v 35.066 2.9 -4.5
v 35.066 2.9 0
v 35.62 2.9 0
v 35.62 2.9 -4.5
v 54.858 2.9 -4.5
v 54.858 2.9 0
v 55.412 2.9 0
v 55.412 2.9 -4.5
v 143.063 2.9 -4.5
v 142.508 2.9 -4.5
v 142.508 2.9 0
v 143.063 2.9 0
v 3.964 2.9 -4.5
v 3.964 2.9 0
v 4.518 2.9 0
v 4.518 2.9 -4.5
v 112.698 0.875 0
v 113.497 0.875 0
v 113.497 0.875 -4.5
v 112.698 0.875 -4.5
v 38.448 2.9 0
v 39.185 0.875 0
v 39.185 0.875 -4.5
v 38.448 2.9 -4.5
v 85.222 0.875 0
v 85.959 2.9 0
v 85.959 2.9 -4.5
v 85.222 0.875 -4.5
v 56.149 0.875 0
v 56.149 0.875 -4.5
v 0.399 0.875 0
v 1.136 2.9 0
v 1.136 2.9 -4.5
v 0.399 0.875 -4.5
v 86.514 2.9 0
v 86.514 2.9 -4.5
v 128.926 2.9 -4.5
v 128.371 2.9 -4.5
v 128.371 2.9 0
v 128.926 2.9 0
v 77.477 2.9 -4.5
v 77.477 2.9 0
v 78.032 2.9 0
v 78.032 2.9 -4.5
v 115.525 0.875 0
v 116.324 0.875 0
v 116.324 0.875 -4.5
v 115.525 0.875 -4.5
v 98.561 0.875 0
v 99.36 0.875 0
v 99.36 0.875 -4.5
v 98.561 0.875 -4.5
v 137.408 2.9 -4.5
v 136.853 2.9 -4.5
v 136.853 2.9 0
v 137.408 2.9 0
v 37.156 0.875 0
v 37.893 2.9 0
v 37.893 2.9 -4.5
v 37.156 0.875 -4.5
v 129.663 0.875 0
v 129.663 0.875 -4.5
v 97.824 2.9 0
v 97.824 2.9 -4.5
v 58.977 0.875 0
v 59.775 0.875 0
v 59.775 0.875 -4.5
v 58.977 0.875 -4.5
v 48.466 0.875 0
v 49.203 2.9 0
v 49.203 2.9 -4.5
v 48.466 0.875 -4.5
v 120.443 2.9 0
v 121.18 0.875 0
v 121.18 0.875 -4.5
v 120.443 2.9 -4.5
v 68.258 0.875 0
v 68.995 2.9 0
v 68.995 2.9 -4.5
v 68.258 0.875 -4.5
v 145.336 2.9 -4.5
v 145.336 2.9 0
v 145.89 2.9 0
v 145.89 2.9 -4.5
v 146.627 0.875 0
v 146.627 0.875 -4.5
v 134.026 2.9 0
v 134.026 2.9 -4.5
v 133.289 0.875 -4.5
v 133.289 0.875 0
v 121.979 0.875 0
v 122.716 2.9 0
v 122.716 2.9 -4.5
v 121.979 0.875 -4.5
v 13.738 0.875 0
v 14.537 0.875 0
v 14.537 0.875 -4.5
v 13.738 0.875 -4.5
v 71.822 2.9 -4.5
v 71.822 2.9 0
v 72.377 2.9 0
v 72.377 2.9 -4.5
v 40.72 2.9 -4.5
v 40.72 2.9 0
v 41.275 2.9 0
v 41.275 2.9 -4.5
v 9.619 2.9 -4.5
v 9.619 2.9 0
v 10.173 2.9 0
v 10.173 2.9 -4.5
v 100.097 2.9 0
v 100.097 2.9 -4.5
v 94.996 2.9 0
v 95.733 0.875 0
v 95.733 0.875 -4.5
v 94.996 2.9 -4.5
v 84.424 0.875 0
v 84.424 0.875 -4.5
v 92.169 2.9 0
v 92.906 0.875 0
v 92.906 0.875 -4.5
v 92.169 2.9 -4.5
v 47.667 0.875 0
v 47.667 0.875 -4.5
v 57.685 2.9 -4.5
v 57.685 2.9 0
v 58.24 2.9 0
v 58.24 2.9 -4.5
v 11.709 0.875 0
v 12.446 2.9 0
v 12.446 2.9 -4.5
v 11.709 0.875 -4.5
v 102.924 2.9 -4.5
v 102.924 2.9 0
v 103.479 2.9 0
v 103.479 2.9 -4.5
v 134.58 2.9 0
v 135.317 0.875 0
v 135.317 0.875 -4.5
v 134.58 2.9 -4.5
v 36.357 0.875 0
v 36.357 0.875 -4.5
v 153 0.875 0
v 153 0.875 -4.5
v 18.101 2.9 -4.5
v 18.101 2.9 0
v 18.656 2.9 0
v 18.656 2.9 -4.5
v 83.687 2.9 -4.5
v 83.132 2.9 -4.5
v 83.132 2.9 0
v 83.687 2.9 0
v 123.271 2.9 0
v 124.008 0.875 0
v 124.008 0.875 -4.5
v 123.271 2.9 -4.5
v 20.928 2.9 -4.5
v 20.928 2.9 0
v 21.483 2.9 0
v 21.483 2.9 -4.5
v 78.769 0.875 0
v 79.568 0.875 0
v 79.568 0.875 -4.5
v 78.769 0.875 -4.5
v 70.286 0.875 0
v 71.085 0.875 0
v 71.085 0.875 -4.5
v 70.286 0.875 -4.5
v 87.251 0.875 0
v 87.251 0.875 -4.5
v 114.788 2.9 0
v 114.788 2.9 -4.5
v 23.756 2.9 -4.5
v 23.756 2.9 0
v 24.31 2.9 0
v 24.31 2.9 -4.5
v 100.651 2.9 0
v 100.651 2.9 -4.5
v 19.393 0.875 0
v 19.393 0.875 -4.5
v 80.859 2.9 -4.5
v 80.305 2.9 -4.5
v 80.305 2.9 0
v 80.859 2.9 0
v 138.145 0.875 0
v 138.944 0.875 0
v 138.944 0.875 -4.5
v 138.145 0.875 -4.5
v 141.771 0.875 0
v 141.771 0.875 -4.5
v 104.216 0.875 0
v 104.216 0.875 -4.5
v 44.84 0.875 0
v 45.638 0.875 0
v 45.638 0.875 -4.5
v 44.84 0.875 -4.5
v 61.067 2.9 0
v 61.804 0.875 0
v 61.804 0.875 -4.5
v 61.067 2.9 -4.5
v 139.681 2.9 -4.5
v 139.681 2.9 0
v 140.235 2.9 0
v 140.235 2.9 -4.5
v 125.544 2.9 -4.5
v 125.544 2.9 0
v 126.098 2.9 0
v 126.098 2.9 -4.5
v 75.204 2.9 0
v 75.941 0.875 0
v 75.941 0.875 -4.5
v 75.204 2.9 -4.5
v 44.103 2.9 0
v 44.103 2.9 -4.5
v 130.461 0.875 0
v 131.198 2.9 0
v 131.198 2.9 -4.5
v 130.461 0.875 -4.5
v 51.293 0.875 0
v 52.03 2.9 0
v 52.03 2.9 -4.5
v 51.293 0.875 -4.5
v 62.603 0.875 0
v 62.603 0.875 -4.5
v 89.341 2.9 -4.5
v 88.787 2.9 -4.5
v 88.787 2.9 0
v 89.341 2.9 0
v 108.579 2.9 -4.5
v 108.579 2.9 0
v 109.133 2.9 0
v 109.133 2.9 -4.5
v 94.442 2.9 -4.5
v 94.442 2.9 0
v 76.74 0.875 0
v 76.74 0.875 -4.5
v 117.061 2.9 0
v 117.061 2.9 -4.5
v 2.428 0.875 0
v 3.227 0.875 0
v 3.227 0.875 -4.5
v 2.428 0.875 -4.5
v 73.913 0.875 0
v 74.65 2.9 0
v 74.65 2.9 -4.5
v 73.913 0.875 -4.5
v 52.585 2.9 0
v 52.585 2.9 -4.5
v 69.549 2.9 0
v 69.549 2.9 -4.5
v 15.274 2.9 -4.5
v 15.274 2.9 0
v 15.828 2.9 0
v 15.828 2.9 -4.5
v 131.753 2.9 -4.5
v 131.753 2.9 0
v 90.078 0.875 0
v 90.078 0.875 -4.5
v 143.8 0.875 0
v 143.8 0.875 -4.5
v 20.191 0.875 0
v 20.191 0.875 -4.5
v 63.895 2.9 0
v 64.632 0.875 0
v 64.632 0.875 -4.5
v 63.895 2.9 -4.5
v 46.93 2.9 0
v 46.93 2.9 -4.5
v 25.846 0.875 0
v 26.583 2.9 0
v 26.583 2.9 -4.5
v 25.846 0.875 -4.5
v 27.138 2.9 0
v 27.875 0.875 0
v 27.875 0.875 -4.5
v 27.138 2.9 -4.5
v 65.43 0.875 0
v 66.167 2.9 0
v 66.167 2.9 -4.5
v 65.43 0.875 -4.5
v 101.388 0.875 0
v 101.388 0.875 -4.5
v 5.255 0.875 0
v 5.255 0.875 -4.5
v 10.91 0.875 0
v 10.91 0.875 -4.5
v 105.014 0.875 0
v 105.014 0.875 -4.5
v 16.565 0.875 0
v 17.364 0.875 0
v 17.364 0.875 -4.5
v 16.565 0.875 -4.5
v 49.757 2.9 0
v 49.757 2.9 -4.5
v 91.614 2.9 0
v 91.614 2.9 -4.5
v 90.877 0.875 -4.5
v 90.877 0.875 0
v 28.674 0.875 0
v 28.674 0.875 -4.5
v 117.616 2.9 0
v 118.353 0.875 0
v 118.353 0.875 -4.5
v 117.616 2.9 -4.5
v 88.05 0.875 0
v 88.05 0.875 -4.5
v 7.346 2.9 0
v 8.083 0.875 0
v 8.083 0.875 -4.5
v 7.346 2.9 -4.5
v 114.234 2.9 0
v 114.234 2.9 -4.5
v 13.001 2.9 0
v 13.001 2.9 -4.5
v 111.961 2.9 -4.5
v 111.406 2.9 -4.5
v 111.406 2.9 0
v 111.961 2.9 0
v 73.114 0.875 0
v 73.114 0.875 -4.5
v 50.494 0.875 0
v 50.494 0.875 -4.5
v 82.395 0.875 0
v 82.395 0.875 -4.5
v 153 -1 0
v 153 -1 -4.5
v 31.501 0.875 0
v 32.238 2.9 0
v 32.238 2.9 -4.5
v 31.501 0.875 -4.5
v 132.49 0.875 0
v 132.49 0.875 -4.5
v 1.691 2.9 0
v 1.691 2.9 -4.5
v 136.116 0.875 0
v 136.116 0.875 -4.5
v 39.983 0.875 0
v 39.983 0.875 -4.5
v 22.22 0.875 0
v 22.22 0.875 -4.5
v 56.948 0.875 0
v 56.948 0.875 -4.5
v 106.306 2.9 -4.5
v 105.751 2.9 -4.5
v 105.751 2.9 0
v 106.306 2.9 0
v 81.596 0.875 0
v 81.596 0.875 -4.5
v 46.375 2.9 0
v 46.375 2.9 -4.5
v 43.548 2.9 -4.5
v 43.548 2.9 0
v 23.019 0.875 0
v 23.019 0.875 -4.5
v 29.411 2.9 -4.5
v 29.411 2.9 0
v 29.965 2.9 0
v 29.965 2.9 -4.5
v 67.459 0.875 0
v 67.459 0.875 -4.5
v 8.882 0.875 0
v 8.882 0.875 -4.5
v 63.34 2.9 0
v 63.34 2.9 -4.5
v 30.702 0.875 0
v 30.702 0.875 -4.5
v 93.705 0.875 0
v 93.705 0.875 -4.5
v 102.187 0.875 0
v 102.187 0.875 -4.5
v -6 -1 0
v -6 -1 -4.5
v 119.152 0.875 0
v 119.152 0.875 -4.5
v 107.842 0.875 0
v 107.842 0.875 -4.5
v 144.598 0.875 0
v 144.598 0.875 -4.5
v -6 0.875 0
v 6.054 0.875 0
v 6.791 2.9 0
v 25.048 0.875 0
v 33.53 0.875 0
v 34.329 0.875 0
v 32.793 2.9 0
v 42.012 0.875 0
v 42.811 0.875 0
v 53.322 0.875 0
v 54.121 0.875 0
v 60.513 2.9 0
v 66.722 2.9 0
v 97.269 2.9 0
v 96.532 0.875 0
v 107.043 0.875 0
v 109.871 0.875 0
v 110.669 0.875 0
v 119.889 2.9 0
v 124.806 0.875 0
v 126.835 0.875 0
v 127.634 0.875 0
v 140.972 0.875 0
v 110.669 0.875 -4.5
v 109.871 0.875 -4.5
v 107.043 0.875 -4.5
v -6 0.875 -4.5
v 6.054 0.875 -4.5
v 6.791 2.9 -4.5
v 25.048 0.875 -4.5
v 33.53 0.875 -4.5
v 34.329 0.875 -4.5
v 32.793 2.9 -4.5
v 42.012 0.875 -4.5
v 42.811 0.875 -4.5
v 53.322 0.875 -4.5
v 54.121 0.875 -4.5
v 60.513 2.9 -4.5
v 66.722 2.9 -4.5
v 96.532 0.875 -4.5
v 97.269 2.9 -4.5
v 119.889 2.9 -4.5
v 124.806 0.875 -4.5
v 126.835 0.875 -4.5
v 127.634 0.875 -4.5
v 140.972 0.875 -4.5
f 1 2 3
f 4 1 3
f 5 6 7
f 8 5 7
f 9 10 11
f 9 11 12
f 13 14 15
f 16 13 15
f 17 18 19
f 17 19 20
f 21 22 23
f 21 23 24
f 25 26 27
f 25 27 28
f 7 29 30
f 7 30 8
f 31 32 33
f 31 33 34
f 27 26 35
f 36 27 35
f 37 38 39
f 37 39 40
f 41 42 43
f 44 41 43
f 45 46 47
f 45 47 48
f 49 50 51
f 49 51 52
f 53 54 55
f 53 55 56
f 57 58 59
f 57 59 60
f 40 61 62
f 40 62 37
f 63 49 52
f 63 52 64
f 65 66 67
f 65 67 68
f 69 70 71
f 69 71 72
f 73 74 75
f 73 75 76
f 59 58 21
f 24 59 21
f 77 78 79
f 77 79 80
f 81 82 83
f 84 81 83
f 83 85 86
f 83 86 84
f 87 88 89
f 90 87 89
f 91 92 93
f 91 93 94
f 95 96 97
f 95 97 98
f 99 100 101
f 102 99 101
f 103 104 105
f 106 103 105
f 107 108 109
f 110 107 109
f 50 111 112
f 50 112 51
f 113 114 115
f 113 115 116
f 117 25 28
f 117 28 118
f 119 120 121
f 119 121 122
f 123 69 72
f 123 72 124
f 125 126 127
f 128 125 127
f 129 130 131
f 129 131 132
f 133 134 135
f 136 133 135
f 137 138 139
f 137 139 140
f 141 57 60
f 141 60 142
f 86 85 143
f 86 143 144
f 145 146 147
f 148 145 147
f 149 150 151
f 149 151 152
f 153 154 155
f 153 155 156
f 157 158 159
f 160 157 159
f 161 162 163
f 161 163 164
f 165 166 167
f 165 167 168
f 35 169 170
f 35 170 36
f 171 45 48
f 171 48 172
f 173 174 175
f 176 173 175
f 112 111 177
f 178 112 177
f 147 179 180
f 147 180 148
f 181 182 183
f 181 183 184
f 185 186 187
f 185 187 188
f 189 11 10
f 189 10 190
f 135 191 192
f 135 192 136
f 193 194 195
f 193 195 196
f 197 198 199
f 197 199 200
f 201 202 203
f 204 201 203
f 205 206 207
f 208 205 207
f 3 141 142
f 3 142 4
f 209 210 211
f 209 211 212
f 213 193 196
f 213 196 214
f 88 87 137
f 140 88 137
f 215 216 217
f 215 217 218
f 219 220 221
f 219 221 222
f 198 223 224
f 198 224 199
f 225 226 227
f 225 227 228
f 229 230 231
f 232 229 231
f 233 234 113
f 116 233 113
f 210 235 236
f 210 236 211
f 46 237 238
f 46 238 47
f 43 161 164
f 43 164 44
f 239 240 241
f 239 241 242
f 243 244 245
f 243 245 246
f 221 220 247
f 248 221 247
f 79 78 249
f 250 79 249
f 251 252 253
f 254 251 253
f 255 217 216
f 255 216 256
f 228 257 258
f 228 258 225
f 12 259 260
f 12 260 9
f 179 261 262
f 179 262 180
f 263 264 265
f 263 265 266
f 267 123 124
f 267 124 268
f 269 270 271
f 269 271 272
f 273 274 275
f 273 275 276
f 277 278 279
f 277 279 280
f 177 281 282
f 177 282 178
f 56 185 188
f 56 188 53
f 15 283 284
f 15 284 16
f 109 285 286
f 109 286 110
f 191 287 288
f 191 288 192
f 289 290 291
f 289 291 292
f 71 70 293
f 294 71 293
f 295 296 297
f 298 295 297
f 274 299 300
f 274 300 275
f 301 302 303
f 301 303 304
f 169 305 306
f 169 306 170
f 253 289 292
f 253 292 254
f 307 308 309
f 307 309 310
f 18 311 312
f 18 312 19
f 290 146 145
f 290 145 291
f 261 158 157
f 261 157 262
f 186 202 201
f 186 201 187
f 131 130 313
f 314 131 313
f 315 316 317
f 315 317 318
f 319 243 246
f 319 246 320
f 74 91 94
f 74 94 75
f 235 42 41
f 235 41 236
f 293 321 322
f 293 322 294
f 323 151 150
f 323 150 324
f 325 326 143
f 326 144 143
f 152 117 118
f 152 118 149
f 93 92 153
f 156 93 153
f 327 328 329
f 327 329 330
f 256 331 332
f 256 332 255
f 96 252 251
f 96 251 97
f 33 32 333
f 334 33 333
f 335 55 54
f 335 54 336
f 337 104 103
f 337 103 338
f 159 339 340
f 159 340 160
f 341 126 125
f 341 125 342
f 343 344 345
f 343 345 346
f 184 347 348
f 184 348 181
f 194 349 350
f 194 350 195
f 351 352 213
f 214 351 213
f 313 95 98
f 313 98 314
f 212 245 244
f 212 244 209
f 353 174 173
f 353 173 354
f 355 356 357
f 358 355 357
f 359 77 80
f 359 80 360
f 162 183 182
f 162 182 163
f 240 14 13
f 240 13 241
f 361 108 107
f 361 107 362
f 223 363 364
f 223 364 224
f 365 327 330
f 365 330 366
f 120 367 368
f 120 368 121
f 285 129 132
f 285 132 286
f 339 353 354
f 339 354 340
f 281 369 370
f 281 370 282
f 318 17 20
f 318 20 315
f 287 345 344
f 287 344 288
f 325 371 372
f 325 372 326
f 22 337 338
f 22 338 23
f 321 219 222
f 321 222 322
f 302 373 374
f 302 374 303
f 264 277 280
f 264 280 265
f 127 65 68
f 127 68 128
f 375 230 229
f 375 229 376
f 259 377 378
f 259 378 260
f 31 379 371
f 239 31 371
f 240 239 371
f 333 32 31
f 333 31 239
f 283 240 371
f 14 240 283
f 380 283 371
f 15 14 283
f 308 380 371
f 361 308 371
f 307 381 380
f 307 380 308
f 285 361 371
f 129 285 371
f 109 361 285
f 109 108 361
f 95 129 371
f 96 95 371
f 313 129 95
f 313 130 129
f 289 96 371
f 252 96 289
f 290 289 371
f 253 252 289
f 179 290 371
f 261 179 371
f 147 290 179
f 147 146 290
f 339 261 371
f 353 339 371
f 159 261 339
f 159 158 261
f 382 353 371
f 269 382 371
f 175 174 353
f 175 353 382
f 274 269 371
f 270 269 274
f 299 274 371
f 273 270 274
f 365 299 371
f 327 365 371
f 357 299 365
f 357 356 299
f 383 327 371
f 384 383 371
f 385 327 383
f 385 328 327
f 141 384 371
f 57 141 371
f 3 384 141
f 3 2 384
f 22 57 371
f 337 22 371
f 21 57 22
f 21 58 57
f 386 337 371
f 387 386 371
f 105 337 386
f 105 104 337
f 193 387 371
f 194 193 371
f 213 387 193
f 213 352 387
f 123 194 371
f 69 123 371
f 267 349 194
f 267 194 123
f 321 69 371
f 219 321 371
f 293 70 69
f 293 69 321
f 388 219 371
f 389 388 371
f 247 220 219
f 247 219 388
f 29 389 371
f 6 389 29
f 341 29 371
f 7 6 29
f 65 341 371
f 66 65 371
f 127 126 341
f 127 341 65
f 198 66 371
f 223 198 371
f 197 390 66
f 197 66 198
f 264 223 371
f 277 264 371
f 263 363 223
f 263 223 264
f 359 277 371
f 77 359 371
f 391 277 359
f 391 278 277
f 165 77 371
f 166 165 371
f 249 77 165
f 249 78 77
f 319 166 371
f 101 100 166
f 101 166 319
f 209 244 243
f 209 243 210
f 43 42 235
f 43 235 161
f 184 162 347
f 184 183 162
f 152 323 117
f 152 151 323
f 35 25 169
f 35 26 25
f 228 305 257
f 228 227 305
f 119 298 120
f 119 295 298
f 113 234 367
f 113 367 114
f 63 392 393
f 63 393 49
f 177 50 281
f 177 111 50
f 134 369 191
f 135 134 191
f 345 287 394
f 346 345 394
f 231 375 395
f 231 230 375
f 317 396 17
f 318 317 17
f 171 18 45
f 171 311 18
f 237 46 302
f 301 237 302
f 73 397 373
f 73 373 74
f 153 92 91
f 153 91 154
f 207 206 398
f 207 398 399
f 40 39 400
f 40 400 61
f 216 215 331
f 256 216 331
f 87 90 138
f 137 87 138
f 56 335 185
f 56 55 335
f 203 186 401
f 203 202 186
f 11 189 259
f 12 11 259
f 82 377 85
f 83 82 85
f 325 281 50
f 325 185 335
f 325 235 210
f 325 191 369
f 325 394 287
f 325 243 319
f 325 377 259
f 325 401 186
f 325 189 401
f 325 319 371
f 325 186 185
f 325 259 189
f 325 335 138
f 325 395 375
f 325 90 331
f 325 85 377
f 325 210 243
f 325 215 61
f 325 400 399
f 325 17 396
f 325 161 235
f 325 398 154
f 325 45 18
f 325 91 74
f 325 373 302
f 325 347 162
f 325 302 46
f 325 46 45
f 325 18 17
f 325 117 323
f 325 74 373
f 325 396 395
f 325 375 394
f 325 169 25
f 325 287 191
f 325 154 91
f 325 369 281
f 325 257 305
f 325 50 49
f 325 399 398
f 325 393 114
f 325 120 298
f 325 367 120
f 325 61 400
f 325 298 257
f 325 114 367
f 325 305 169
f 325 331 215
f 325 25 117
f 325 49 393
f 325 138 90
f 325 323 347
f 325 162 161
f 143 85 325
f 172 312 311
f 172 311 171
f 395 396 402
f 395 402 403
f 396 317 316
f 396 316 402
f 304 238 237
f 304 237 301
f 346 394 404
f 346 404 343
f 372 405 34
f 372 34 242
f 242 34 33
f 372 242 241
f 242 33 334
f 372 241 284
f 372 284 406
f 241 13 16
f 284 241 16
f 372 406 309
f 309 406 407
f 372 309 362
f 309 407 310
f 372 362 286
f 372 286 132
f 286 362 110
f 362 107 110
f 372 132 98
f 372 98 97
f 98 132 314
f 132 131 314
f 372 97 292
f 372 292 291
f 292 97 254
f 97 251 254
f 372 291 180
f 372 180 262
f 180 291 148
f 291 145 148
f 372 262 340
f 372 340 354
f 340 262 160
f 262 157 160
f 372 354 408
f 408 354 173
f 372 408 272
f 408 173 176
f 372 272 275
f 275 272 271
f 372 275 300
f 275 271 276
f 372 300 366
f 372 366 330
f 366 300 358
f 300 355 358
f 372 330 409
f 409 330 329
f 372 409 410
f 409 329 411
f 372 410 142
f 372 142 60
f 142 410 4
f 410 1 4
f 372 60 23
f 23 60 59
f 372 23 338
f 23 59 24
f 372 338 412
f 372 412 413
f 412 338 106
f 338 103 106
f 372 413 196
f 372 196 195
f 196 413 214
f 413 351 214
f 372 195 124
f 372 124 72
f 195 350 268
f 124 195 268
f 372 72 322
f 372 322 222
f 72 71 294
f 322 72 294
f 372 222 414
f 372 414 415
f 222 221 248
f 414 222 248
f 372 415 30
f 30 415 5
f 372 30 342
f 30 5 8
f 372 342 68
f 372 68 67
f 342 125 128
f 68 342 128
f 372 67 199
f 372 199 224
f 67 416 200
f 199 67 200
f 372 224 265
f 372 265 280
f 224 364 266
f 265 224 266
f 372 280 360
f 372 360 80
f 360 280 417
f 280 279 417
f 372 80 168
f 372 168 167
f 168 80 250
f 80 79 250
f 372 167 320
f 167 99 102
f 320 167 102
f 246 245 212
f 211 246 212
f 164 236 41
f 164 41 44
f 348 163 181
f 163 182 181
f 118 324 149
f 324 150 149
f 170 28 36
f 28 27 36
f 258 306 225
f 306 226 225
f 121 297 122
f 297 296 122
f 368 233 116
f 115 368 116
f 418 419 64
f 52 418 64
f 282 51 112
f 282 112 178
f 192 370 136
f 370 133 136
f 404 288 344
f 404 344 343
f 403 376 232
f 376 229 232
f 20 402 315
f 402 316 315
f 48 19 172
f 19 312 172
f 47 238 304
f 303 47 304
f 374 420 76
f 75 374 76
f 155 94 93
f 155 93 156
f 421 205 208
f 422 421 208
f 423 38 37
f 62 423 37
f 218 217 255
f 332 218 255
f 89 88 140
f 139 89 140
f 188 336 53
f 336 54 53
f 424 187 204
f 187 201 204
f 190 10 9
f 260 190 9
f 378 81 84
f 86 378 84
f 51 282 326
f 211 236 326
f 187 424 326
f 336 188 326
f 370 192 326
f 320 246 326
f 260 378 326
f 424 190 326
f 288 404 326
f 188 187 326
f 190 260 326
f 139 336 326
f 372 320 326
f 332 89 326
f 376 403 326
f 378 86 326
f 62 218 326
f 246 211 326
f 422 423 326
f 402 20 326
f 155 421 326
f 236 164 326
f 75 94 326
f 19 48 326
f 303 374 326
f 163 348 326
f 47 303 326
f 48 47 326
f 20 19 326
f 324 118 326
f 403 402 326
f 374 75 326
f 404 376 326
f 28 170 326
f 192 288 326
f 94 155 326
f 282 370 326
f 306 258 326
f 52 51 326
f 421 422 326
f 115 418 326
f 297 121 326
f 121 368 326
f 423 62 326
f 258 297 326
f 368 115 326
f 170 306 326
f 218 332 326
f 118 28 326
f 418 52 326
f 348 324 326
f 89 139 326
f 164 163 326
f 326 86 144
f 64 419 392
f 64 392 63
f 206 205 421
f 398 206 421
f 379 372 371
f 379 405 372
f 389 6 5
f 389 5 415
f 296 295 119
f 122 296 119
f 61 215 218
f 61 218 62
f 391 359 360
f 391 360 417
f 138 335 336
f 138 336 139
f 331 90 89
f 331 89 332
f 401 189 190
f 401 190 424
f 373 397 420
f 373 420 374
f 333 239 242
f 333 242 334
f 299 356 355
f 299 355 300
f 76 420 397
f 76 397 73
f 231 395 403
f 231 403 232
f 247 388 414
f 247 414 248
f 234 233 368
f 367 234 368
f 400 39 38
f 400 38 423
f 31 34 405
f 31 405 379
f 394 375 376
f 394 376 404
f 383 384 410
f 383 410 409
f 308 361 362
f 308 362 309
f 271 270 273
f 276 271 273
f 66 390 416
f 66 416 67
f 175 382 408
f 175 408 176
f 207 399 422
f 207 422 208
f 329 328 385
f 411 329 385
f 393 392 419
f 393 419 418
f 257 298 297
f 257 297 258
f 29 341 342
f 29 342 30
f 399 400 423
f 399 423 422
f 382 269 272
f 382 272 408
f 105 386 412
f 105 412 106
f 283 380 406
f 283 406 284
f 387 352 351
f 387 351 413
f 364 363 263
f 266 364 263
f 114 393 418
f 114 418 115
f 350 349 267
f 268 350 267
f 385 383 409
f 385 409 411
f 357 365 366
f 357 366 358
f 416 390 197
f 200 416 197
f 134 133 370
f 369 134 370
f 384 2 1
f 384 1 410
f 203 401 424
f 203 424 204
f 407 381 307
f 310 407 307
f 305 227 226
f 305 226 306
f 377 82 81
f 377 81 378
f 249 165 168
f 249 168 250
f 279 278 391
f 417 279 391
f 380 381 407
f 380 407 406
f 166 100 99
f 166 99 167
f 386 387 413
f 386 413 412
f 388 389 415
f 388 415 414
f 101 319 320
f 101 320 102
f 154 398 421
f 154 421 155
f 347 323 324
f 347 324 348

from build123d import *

# Parameters (mm, degrees)
BLANKSKE_W          = 147
BLANKSKE_H          = 2.9
BLANK_DEPTH         = 4.5
TOOTHCUTSIM_DEPTH   = 148.097450692
TEETHCUTS_COUNT     = 53
TEETHCUTS_PITCH     = 2.827433385
SKETCH1_W           = 4.5
SKETCH1_H           = 0.875
BOSS_EXTRUDE1_DEPTH = 6
SKETCH2_W           = 4.5
SKETCH2_H           = 0.875
BOSS_EXTRUDE2_DEPTH = 6
SKETCH3_W           = 159
SKETCH3_H           = 4.5
BOSS_EXTRUDE3_DEPTH = 1


with BuildPart() as part:
    # BlankSke → Blank (new body)
    with BuildSketch(Plane.XY):
        with Locations((73.5, 1.45)):
            Rectangle(BLANKSKE_W, BLANKSKE_H)
    extrude(amount=-BLANK_DEPTH)

    # TooCutSkeSim → ToothCutSim (cut, through all)
    with BuildSketch(Plane.XY):
        Polygon((0.399391833, 0.875), (-0.399391833, 0.875), (-1.145676401, 2.9254), (1.145676401, 2.9254), align=None)
    toothcutsim = extrude(amount=-TOOTHCUTSIM_DEPTH, mode=Mode.SUBTRACT)

    # TeethCuts: ToothCutSim ×53
    with Locations(*[(i * TEETHCUTS_PITCH, 0, 0) for i in range(1, TEETHCUTS_COUNT)]):
        add(toothcutsim, mode=Mode.SUBTRACT)

    # Sketch1 → Boss-Extrude1 (add)
    with BuildSketch(Plane(origin=(147, 0, 0), x_dir=(0, 0, -1), z_dir=(1, 0, 0))):
        with Locations((2.25, 0.4375)):
            Rectangle(SKETCH1_W, SKETCH1_H)
    extrude(amount=BOSS_EXTRUDE1_DEPTH)

    # Sketch2 → Boss-Extrude2 (add)
    with BuildSketch(Plane.ZY):
        with Locations((-2.25, 0.4375)):
            Rectangle(SKETCH2_W, SKETCH2_H)
    extrude(amount=BOSS_EXTRUDE2_DEPTH)

    # Sketch3 → Boss-Extrude3 (add)
    with BuildSketch(Plane.XZ):
        with Locations((73.5, -2.25)):
            Rectangle(SKETCH3_W, SKETCH3_H)
    extrude(amount=BOSS_EXTRUDE3_DEPTH)


solid = part.part
